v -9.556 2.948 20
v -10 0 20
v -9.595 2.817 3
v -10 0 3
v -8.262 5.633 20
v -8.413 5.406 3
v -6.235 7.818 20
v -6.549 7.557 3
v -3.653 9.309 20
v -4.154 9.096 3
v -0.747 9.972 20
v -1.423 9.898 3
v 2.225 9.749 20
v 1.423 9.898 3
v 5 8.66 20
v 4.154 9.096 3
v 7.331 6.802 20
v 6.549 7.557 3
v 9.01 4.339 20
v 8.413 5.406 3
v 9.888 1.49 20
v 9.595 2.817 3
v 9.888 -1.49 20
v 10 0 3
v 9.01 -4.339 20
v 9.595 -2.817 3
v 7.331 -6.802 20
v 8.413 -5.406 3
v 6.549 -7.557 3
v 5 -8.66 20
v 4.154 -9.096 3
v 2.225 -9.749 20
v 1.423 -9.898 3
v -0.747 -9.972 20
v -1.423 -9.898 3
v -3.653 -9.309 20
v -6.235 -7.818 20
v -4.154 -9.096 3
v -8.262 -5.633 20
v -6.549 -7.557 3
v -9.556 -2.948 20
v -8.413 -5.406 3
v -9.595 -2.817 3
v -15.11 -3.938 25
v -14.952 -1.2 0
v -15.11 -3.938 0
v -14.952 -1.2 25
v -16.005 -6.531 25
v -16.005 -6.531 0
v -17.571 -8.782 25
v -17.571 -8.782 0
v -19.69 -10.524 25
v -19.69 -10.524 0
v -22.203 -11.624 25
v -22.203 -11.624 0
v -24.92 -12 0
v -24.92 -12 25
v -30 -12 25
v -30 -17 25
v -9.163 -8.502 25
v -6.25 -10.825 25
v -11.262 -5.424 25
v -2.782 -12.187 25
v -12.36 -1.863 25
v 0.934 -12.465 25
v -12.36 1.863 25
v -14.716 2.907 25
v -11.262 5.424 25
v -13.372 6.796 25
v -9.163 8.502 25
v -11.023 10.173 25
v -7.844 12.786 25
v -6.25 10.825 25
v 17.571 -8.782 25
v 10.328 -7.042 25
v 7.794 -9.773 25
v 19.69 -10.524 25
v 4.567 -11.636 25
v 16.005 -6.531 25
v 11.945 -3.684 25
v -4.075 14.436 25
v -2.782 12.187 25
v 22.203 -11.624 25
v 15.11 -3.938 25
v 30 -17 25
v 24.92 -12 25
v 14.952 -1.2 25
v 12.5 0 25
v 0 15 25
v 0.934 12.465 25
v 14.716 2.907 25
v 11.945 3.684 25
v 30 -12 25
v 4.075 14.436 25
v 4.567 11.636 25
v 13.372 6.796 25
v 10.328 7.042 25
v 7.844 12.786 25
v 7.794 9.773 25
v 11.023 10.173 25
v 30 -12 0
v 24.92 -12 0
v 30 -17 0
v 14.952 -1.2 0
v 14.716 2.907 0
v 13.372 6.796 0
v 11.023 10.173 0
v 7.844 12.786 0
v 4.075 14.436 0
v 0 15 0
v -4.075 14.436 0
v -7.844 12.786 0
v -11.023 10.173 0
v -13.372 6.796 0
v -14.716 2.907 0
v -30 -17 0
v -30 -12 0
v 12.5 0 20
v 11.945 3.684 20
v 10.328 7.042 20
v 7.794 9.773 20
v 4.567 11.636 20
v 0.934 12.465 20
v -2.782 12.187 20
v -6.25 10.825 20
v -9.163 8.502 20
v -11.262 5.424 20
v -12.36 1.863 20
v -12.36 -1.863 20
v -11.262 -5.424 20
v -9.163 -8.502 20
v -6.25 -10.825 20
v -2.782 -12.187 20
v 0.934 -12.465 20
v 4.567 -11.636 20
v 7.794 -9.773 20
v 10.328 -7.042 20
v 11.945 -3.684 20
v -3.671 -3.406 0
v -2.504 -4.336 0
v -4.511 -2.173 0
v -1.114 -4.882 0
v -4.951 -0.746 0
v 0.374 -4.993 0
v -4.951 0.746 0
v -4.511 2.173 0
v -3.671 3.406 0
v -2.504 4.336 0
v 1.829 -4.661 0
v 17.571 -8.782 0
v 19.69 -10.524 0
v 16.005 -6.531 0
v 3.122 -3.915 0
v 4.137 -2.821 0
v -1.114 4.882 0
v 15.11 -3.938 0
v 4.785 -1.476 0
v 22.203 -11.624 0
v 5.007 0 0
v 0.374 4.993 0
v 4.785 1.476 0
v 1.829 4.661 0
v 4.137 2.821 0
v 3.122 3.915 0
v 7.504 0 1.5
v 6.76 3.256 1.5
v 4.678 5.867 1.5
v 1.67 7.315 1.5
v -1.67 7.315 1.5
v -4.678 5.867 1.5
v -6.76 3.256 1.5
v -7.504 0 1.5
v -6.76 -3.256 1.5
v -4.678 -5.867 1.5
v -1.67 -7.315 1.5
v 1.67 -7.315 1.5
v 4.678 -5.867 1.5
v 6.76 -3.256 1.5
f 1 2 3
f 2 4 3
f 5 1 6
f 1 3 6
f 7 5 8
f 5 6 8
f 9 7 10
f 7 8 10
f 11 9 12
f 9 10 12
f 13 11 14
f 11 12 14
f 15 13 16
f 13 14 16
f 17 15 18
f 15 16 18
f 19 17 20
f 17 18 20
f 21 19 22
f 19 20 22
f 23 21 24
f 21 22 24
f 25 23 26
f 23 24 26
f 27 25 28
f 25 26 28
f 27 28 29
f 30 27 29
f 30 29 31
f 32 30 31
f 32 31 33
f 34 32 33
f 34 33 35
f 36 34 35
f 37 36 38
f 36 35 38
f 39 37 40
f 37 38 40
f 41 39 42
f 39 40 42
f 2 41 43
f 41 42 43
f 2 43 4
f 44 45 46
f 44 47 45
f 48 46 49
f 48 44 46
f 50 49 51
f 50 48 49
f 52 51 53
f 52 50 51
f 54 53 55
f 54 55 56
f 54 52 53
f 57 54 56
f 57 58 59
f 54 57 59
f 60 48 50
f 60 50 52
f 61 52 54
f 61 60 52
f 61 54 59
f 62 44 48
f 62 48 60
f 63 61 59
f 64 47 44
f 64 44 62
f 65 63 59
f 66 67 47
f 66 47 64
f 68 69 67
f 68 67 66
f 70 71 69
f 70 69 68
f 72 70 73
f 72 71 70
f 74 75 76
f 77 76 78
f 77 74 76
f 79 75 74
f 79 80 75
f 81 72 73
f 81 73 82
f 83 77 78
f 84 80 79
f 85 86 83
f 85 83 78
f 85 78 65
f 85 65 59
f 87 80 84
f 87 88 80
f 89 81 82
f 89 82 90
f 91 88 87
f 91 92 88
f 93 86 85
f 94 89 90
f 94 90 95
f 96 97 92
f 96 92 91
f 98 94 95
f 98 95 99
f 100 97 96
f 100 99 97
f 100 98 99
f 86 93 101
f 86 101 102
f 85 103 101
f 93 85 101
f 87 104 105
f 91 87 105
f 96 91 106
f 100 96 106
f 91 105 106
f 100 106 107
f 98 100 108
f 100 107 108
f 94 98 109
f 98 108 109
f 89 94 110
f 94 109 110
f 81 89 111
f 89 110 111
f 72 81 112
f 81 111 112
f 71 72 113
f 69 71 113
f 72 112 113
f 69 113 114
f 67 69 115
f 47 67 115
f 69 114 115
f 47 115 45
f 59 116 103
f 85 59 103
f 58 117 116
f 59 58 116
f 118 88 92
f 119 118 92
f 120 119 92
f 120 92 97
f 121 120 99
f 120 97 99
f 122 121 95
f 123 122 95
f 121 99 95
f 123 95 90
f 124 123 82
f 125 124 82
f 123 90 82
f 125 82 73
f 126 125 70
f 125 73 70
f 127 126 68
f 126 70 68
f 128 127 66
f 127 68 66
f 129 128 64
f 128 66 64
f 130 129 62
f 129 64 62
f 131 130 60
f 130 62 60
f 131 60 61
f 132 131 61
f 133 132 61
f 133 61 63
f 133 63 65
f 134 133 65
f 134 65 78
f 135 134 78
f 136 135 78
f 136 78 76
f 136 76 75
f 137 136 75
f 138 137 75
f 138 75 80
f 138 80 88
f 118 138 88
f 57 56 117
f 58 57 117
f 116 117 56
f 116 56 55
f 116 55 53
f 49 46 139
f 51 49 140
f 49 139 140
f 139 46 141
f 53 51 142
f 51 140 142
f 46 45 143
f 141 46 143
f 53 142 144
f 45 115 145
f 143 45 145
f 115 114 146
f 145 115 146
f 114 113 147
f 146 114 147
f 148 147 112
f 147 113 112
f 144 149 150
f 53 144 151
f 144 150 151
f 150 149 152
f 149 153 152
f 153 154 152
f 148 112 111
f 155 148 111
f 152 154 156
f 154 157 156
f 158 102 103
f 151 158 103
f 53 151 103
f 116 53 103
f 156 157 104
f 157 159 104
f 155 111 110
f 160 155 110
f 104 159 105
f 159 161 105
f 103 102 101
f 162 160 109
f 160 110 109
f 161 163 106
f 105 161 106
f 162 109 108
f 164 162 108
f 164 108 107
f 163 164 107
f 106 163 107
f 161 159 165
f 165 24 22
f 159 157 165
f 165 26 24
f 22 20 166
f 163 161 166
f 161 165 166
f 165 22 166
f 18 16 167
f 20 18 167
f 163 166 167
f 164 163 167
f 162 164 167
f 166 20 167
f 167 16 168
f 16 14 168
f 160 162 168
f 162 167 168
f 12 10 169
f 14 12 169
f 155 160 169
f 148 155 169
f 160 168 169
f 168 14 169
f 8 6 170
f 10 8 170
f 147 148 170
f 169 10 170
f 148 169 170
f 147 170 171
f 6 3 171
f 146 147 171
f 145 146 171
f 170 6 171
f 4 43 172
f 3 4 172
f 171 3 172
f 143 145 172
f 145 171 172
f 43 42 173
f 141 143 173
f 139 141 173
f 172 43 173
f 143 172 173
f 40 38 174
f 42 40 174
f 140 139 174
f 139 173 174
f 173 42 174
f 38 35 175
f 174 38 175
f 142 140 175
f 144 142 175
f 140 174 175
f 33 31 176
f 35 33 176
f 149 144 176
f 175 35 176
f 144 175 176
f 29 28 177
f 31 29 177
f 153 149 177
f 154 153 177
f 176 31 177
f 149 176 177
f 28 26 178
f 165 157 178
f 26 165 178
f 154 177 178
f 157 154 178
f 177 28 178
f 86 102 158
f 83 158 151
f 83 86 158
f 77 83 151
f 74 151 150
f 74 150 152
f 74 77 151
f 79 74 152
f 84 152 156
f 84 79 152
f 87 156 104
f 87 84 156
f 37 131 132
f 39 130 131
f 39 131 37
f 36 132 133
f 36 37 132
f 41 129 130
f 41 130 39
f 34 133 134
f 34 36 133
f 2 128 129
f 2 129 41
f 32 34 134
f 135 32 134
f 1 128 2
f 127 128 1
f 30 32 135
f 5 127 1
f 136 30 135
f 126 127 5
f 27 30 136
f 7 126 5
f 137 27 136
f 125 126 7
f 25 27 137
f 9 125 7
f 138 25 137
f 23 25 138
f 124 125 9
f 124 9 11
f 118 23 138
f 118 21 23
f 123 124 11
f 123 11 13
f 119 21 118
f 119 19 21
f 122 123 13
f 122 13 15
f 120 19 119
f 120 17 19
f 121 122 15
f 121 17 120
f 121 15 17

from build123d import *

# Parameters (mm, degrees)
F1_DEPTH       = 25
F2_R           = 10
F4_D           = 20
F4_DEPTH       = 22
F4_CBORE_D     = 25
F4_CBORE_DEPTH = 5
F4_TIP         = 6.0086061903


with BuildPart() as f1:
    # F0 (on Top) → F1 (new body)
    with BuildSketch(Plane.XY):
        with BuildLine():
            Line((9, -12), (-9, -12))
            ThreePointArc((-9, -12), (0, -15), (9, -12))
        make_face()
        with BuildLine():
            ThreePointArc((9, -12), (0, -15), (-9, -12))
            Line((-9, -12), (-30, -12))
            Line((-30, -12), (-30, -17))
            Line((-30, -17), (30, -17))
            Line((30, -17), (30, -12))
            Line((30, -12), (9, -12))
        make_face()
        with BuildLine():
            ThreePointArc((9, -12), (13.416407865, -6.7082039325), (15, 0))
            ThreePointArc((15, 0), (-6.7082039325, 13.416407865), (-9, -12))
            Line((-9, -12), (9, -12))
        make_face()
    extrude(amount=F1_DEPTH)

    # F2
    f2_edges = [f1.edges().sort_by_distance(p)[0] for p in [
        (-9, -12, 12.5),
        (9, -12, 12.5),
    ]]
    fillet(f2_edges, radius=F2_R)

    # F4
    with Locations(Plane.XY.offset(25)):
        with Locations((0, 0)):
            CounterBoreHole(F4_D / 2, F4_CBORE_D / 2, F4_CBORE_DEPTH, depth=F4_DEPTH)
            with Locations((0, 0, -(F4_DEPTH + F4_TIP / 2))):  # 118° drill point
                Cone(0, F4_D / 2, F4_TIP, mode=Mode.SUBTRACT)


solid = f1.part
